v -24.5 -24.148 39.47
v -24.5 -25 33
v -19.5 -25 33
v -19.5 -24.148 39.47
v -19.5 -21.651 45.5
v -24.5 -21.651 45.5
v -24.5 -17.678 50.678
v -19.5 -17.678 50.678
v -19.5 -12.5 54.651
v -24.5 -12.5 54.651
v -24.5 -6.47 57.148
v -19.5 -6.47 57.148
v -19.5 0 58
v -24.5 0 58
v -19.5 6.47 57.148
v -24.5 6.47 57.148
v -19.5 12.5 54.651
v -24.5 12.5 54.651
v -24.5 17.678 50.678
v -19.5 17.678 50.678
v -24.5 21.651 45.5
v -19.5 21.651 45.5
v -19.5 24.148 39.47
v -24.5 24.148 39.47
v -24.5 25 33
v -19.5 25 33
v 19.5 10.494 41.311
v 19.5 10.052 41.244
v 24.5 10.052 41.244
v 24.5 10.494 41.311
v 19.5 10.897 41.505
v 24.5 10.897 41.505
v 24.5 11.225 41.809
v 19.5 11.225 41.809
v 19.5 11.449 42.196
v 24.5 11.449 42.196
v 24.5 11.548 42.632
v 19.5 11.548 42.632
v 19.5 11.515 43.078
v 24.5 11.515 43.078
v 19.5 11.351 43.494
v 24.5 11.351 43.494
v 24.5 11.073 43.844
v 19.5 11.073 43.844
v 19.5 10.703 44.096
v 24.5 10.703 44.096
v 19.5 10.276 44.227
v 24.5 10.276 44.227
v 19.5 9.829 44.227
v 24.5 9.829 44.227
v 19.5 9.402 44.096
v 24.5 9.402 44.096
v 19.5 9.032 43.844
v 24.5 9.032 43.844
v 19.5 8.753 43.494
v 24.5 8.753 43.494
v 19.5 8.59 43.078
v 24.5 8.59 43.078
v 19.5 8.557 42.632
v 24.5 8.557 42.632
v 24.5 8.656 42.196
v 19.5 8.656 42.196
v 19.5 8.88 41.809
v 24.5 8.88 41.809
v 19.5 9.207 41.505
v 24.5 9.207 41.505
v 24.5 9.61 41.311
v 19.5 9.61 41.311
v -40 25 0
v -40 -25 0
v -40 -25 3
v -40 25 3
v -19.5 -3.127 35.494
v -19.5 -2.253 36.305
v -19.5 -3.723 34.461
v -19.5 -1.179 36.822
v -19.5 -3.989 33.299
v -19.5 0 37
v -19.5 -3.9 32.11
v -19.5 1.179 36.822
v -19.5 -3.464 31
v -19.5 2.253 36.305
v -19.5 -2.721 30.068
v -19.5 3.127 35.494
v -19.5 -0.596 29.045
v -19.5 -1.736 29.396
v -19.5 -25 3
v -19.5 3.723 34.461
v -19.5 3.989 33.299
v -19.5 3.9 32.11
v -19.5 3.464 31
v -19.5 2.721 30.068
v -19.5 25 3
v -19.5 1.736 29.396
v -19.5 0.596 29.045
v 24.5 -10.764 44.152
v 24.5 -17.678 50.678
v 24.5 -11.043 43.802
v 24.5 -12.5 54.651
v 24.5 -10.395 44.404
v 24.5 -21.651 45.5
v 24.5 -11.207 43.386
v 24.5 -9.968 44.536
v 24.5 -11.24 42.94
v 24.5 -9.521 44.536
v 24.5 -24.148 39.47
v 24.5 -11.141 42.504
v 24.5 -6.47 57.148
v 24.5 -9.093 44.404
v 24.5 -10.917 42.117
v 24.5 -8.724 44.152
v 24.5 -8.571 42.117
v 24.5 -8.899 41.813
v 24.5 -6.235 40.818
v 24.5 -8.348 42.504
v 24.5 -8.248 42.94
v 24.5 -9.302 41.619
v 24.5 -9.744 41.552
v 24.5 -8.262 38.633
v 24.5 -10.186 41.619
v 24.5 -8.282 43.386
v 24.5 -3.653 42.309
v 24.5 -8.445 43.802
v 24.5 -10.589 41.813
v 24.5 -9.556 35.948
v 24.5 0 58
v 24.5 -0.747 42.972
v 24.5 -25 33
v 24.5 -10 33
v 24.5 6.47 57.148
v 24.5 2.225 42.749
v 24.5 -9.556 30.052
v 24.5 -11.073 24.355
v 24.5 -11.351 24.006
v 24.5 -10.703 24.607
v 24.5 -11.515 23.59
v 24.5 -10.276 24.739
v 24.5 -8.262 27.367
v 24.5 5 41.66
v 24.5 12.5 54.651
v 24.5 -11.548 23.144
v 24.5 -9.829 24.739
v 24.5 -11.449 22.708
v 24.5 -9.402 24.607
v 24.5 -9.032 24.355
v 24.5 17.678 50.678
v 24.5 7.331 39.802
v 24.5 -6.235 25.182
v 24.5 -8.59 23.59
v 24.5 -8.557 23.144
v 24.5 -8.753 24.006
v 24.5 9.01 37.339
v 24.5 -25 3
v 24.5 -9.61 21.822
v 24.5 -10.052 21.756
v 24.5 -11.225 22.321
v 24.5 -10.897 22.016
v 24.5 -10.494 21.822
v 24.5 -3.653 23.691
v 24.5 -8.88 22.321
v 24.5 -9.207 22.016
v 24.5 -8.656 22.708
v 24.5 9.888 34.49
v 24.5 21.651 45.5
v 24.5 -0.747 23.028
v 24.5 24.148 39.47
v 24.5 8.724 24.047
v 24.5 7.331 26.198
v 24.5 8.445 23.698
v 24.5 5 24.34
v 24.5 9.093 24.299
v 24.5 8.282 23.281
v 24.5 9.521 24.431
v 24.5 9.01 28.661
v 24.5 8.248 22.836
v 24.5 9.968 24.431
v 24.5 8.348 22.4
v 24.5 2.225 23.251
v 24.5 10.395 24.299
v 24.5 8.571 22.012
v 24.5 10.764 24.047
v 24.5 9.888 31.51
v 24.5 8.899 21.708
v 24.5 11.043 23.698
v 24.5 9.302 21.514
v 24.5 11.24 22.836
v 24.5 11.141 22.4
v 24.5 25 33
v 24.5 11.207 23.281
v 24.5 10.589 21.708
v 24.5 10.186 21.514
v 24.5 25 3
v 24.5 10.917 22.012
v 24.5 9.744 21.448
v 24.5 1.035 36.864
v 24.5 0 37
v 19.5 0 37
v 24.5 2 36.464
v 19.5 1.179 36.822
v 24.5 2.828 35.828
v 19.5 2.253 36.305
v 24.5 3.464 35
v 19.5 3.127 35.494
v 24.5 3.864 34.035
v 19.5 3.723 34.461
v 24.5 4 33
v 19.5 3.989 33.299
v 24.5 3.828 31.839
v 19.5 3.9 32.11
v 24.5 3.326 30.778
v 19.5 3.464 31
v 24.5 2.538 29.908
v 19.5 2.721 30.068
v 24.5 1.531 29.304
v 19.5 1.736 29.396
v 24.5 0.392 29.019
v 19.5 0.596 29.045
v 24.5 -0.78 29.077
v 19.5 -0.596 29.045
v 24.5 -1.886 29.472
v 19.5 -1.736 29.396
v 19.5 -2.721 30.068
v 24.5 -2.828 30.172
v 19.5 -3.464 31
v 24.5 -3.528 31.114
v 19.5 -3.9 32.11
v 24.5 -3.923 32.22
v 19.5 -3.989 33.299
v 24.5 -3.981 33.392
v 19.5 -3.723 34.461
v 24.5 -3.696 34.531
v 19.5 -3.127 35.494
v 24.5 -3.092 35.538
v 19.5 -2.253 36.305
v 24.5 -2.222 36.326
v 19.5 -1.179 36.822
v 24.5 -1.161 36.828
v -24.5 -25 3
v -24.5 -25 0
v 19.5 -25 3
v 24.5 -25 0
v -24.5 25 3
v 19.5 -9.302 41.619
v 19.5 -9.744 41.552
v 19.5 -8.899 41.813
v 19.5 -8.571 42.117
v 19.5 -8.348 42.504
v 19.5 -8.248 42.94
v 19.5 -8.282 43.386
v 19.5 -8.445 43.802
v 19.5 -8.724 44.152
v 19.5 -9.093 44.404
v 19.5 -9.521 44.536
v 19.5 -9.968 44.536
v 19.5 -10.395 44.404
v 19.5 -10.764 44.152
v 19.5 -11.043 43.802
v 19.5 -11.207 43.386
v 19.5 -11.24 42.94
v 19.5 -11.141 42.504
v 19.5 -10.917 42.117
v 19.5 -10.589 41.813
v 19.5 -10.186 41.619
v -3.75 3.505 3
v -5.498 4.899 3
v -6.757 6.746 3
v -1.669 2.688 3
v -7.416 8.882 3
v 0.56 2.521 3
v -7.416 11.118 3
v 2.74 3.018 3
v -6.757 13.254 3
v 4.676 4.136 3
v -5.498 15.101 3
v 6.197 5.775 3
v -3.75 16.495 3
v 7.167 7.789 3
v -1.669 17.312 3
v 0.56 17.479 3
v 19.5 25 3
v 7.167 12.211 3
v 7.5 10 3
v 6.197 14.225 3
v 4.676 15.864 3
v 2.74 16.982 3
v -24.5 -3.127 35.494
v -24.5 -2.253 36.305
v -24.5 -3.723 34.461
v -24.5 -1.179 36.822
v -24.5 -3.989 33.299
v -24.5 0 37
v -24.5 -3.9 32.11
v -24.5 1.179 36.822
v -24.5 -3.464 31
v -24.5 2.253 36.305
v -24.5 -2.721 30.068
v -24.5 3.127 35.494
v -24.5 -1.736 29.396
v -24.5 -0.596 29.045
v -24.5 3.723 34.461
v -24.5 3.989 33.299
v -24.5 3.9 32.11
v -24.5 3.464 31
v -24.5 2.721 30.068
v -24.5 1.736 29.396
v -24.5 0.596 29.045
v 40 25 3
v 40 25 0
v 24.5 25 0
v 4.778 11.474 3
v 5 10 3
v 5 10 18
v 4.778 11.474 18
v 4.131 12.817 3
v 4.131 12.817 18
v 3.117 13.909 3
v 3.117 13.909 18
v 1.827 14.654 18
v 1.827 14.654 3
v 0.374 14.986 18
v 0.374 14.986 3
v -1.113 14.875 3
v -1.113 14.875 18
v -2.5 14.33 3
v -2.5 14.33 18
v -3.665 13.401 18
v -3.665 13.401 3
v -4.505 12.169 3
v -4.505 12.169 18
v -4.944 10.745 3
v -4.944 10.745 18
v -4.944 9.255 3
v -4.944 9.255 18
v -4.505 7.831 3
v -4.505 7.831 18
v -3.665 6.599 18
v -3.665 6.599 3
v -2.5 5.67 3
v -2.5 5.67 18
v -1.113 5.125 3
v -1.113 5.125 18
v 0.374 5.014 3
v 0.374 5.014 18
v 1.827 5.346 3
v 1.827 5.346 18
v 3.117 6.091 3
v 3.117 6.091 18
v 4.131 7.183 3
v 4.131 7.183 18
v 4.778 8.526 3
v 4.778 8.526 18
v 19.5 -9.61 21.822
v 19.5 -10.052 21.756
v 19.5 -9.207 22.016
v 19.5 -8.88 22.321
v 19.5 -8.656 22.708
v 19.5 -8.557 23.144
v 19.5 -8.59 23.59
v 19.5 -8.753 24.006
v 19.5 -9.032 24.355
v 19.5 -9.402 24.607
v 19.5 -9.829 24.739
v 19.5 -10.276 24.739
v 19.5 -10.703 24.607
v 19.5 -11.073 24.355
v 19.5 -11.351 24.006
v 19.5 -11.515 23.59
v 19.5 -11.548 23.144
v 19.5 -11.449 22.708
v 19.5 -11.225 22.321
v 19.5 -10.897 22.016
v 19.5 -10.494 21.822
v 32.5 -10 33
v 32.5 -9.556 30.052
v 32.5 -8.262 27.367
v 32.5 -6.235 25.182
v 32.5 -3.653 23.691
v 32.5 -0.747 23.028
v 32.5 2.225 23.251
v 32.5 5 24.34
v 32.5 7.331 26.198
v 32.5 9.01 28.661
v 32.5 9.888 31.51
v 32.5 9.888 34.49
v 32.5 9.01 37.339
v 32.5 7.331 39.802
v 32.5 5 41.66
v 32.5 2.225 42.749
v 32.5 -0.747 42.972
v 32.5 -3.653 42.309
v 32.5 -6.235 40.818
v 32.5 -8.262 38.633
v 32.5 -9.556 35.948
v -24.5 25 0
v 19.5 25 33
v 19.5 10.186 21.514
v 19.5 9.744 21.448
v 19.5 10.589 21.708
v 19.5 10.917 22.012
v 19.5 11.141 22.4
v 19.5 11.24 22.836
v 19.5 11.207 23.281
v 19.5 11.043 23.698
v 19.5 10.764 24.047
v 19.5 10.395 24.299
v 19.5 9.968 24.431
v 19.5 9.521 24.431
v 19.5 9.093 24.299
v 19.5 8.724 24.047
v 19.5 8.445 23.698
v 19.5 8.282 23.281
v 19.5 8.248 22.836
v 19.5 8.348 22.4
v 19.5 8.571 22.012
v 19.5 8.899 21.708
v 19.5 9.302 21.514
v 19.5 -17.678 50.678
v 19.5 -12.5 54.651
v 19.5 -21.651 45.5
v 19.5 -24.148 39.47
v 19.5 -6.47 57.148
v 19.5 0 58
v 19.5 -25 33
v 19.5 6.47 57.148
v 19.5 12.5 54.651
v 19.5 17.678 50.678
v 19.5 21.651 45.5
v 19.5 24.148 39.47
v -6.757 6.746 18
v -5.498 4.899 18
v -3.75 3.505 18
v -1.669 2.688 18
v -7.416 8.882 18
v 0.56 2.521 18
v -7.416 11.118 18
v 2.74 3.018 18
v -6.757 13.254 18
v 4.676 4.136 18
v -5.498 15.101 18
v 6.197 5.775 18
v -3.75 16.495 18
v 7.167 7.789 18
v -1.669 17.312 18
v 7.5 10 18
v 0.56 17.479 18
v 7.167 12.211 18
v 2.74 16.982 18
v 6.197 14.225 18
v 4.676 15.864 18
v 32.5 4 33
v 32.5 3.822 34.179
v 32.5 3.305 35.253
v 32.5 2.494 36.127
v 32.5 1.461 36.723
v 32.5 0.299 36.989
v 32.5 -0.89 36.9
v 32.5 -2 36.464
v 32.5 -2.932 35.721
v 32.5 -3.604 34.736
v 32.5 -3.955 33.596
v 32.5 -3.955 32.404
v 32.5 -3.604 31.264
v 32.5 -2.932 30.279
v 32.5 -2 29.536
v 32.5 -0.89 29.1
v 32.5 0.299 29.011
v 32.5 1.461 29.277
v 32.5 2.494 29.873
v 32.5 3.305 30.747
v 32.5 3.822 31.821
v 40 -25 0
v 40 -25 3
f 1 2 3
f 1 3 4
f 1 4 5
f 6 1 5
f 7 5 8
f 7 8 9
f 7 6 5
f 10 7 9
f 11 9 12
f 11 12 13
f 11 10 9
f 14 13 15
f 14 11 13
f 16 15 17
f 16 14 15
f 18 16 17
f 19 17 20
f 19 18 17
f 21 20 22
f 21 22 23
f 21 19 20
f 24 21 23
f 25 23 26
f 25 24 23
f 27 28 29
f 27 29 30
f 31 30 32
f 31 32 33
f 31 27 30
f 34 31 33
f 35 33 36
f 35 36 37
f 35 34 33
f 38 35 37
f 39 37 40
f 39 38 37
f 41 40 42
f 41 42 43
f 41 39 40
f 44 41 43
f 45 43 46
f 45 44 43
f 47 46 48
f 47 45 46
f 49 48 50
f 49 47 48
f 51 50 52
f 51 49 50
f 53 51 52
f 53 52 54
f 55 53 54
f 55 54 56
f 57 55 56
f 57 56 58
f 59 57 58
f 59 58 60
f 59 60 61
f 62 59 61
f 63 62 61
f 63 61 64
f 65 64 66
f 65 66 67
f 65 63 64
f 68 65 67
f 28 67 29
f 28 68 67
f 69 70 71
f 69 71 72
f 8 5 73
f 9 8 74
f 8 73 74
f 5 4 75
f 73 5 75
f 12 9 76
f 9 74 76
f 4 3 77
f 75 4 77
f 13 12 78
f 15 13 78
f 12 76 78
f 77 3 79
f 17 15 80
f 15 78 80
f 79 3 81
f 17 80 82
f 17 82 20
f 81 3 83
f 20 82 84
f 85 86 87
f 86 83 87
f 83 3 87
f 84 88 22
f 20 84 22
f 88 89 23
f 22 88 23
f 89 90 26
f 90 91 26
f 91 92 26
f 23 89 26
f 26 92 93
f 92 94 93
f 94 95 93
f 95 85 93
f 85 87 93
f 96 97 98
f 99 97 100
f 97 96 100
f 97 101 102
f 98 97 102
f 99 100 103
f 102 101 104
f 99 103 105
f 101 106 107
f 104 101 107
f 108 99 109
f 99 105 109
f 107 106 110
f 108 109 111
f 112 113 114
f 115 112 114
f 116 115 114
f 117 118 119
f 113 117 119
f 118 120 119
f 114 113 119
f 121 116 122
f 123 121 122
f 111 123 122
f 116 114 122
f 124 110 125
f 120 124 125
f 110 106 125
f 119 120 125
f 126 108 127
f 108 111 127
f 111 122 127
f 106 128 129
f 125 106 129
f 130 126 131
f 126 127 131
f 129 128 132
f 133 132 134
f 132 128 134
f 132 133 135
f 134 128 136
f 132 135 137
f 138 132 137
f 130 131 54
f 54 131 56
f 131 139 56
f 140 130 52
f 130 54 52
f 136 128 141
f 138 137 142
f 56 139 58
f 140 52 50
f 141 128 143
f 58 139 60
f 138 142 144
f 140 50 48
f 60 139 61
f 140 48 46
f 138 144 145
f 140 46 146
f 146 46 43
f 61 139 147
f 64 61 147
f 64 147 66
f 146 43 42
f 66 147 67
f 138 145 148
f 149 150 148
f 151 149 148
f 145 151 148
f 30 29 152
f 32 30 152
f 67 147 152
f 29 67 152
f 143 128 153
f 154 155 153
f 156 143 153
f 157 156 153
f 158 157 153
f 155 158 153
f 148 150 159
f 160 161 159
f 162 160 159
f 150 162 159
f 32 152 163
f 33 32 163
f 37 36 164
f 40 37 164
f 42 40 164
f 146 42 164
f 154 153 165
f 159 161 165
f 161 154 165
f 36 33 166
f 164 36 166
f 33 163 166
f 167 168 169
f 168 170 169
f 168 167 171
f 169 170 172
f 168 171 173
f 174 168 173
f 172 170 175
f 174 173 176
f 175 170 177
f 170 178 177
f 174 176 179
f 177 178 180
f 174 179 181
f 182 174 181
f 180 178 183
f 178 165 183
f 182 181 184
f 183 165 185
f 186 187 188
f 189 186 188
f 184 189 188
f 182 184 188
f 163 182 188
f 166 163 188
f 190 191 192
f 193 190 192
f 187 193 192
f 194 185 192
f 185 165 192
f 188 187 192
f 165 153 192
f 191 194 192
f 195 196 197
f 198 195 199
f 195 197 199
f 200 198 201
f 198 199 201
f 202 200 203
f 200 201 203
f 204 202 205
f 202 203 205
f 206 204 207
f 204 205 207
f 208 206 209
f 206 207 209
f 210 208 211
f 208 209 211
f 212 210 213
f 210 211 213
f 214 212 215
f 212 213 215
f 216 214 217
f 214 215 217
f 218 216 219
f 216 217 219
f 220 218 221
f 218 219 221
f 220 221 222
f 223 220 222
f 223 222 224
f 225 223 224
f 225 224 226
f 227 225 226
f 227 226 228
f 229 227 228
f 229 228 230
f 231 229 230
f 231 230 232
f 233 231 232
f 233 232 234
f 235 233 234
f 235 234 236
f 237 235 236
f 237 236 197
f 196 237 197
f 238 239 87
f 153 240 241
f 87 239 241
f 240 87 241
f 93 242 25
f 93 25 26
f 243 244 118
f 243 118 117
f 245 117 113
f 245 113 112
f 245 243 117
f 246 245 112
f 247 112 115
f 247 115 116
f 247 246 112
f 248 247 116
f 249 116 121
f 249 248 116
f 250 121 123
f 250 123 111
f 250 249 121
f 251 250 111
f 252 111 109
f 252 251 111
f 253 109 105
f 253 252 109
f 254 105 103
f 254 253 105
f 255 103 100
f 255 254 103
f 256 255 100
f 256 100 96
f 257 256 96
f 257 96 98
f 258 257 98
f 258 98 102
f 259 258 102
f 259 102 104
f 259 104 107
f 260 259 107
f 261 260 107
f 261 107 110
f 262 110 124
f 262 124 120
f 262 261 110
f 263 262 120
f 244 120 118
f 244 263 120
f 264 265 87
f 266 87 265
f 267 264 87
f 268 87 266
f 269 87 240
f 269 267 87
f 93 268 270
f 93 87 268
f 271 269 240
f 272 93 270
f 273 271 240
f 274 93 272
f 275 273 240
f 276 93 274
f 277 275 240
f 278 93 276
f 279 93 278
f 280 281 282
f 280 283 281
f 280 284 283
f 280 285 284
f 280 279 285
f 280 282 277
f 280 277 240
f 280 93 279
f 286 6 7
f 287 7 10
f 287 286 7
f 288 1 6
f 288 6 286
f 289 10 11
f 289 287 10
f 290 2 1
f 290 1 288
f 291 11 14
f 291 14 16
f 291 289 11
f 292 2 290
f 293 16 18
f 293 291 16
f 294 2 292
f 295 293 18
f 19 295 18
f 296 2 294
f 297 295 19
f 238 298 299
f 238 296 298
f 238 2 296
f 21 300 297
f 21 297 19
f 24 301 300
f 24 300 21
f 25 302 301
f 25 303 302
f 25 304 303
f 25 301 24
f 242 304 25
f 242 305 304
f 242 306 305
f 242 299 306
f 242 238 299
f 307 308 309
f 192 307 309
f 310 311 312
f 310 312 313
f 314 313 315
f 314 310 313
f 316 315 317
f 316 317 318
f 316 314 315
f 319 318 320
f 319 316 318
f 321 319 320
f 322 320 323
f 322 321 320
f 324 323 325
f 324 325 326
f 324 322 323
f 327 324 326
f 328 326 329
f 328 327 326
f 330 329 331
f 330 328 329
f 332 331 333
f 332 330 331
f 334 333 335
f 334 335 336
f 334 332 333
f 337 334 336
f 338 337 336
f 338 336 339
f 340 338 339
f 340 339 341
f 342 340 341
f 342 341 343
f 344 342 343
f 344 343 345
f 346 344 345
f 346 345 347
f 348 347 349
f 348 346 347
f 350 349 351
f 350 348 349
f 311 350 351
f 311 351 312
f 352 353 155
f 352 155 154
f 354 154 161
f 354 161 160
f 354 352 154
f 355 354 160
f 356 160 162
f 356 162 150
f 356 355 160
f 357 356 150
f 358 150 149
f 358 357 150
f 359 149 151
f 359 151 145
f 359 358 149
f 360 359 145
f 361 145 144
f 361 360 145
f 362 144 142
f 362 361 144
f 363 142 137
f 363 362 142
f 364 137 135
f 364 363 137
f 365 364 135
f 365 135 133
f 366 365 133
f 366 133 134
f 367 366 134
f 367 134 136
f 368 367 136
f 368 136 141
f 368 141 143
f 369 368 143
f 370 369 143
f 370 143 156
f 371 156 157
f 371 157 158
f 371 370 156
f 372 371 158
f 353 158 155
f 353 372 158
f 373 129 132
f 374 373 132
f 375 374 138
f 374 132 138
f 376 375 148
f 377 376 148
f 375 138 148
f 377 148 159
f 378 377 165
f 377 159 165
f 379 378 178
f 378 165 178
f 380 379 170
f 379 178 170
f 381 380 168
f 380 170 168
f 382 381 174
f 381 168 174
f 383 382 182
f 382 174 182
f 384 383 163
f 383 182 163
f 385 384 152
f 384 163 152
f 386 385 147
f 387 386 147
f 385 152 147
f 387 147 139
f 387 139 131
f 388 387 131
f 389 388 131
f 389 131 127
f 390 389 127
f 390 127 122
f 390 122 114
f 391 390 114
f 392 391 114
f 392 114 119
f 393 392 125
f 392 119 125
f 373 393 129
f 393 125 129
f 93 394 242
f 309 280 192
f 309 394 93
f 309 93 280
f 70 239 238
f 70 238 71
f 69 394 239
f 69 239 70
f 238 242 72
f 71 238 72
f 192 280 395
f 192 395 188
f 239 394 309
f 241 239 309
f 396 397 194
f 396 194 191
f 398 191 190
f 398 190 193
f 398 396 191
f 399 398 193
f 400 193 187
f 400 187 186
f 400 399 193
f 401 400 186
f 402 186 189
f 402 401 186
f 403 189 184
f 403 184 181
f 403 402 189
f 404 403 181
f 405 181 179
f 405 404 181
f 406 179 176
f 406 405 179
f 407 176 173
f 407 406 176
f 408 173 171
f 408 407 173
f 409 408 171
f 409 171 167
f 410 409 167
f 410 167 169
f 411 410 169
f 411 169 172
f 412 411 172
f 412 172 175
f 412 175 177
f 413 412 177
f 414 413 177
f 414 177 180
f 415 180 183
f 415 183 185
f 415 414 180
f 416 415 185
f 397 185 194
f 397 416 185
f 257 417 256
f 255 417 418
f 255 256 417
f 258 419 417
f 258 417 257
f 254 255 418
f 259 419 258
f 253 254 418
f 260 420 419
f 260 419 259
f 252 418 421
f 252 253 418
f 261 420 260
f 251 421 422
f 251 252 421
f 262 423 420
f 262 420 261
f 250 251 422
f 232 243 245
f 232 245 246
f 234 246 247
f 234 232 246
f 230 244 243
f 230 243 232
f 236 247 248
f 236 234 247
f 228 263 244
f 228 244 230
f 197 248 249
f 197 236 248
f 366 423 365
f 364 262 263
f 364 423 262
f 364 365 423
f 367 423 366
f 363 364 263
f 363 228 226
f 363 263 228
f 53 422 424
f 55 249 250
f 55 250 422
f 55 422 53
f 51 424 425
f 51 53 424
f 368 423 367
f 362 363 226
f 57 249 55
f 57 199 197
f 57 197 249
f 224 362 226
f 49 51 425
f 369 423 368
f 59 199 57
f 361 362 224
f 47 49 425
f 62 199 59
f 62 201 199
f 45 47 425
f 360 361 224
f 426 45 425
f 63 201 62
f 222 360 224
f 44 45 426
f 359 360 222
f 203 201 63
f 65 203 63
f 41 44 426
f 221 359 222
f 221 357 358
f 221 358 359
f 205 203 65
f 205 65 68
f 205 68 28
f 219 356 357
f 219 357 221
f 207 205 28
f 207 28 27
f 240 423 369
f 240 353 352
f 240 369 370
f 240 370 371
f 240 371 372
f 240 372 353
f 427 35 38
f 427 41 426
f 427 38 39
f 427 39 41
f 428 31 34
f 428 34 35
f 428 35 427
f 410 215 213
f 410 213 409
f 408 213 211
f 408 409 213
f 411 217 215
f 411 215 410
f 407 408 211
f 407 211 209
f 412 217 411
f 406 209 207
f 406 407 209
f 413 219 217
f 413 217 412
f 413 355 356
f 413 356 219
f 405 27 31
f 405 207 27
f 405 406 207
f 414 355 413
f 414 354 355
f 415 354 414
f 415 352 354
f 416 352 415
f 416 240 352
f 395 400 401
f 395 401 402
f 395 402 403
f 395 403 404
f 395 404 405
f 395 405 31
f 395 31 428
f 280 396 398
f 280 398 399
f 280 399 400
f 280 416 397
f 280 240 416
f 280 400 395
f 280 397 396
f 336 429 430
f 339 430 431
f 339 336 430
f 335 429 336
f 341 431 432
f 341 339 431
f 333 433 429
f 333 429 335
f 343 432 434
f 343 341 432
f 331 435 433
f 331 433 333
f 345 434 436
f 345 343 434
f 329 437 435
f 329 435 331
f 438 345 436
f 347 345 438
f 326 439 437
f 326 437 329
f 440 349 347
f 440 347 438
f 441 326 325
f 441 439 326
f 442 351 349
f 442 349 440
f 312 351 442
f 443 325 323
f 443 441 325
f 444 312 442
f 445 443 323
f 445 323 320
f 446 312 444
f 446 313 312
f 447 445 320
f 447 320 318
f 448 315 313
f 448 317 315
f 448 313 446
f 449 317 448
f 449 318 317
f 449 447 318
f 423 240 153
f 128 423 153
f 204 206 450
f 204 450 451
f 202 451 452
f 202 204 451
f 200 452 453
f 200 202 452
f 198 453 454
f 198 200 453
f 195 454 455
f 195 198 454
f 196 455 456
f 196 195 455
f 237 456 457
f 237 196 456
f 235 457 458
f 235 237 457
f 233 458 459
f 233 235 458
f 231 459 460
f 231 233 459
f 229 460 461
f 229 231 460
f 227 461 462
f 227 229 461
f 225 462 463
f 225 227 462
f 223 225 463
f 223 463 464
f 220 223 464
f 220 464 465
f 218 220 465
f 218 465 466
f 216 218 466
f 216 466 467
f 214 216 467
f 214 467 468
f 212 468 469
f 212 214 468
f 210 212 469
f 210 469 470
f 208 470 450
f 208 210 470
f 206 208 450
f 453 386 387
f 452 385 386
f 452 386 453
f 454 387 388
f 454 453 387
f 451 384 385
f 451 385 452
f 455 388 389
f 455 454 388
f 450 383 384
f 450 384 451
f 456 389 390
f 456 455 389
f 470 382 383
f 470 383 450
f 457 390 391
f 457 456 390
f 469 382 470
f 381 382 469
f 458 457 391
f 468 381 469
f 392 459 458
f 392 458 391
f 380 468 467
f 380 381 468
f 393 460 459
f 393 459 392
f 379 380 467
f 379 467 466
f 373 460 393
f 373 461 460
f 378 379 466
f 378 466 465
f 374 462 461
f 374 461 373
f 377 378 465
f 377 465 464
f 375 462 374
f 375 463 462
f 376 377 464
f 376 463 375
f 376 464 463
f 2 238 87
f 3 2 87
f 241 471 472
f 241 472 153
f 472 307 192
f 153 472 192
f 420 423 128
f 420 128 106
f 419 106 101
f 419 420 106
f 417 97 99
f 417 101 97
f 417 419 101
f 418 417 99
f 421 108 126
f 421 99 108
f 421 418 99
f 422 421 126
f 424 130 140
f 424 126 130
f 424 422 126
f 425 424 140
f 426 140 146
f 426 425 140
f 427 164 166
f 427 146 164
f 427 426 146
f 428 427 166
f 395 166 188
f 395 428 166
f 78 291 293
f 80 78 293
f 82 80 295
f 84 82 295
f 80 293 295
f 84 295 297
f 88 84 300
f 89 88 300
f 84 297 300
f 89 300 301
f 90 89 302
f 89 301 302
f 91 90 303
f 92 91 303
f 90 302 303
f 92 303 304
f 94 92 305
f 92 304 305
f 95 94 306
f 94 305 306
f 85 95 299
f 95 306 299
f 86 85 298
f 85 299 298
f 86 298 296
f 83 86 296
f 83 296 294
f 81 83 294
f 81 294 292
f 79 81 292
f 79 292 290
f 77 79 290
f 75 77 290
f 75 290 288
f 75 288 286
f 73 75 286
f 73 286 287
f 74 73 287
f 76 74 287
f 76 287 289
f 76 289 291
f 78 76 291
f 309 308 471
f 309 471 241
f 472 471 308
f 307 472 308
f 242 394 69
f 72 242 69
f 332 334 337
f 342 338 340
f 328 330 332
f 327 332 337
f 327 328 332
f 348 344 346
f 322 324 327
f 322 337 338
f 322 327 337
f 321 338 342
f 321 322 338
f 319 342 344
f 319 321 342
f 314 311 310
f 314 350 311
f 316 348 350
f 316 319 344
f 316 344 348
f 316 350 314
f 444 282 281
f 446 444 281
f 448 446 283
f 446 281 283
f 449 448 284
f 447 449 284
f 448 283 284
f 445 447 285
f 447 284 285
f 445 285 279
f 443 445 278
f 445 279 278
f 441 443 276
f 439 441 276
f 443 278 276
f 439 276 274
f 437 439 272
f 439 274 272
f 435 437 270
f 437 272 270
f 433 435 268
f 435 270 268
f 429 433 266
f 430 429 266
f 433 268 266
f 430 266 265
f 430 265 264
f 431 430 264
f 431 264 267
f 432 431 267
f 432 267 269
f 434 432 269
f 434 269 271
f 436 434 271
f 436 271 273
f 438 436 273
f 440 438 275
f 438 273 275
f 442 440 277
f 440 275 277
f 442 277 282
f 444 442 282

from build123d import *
from build123d.topology import SkipClean

# Parameters (mm, degrees)
SKETCH1_W              = 49
SKETCH1_H              = 50
BOSS_EXTRUDE1_DEPTH    = 3
SKETCH2_W              = 5
SKETCH2_H              = 50
BOSS_EXTRUDE2_DEPTH    = 55
SKETCH3_OUTSIDE_W      = 78.182
SKETCH3_OUTSIDE_H      = 70.182
SKETCH3_OUTSIDE_R      = 4
CUT_EXTRUDE1_DEPTH     = 80.937475567
SKETCH4_R              = 7.5
SKETCH4_R_2            = 5
BOSS_EXTRUDE3_DEPTH    = 15
SKETCH5_R              = 10
SKETCH5_R_2            = 4
BOSS_EXTRUDE4_DEPTH    = 8
CUT_EXTRUDE2_START     = -5
CUT_EXTRUDE2_OUTLINE_R = 1.5
CUT_EXTRUDE2_DEPTH     = 5
SKETCH7_W              = 80
SKETCH7_H              = 50
BOSS_EXTRUDE5_DEPTH    = 3


# Read off the part's stored shape, not the designer's step: Cut-Extrude2
with BuildPart() as part:
    # Sketch1 → Boss-Extrude1 (new body)
    with BuildSketch(Plane.XY):
        Rectangle(SKETCH1_W, SKETCH1_H)
    extrude(amount=BOSS_EXTRUDE1_DEPTH)

    # Sketch2 → Boss-Extrude2 (add)
    with BuildSketch(Plane.XY.offset(3)):
        with Locations((-22, 0)):
            Rectangle(SKETCH2_W, SKETCH2_H)
        with Locations((22, 0)):
            Rectangle(SKETCH2_W, SKETCH2_H)
    extrude(amount=BOSS_EXTRUDE2_DEPTH)

    # Sketch3 outside → Cut-Extrude1 (cut, through all)
    # profile 1 of 2: a face of its own
    with BuildSketch(Plane.ZY.offset(24.5)):
        with Locations((29, 0)):
            Rectangle(SKETCH3_OUTSIDE_W, SKETCH3_OUTSIDE_H)
        with BuildLine():
            Line((0, 25), (0, -25))
            Line((0, -25), (33, -25))
            ThreePointArc((33, -25), (58, 0), (33, 25))
            Line((33, 25), (0, 25))
        make_face(mode=Mode.SUBTRACT)
    # profile 2 of 2: a face of its own
    with BuildSketch(Plane.ZY.offset(24.5)):
        with Locations((33, 0)):
            Circle(SKETCH3_OUTSIDE_R)
    extrude(amount=-CUT_EXTRUDE1_DEPTH, mode=Mode.SUBTRACT)

    # Sketch4 → Boss-Extrude3 (add)
    with BuildSketch(Plane.XY.offset(3)):
        with Locations((0, 10)):
            Circle(SKETCH4_R)
        with Locations((0, 10)):
            Circle(SKETCH4_R_2, mode=Mode.SUBTRACT)
    extrude(amount=BOSS_EXTRUDE3_DEPTH)

    # Sketch5 → Boss-Extrude4 (add)
    with SkipClean():  # the faces are left unmerged after this step: merging them gives an invalid solid
        with BuildSketch(Plane(origin=(24.5, 0, 0), x_dir=(0, 0, -1), z_dir=(1, 0, 0))):
            with Locations(Location((-33, 0, 0), (0, 0, 270))):
                Circle(SKETCH5_R)
            with Locations(Location((-33, 0, 0), (0, 0, 90))):
                Circle(SKETCH5_R_2, mode=Mode.SUBTRACT)
        extrude(amount=BOSS_EXTRUDE4_DEPTH)

    # Cut-Extrude2 outline → Cut-Extrude2 (cut)
    with SkipClean():  # the faces are left unmerged after this step: merging them gives an invalid solid
        with BuildSketch(Plane(origin=(24.5, 0, 0), x_dir=(0, 0, -1), z_dir=(1, 0, 0)).offset(CUT_EXTRUDE2_START)):
            with Locations((-42.744235689, 10.052356482)):
                Circle(CUT_EXTRUDE2_OUTLINE_R)
            with Locations((-22.947643518, 9.744235689)):
                Circle(CUT_EXTRUDE2_OUTLINE_R)
            with Locations((-23.255764311, -10.052356482)):
                Circle(CUT_EXTRUDE2_OUTLINE_R)
            with Locations((-43.052356482, -9.744235689)):
                Circle(CUT_EXTRUDE2_OUTLINE_R)
        extrude(amount=CUT_EXTRUDE2_DEPTH, mode=Mode.SUBTRACT)

    # Sketch7 → Boss-Extrude5 (add)
    with SkipClean():  # the faces are left unmerged after this step: merging them gives an invalid solid
        with BuildSketch(Plane(origin=(0, 0, 0), x_dir=(-1, 0, 0), z_dir=(0, 0, -1))):
            Rectangle(SKETCH7_W, SKETCH7_H)
        extrude(amount=-BOSS_EXTRUDE5_DEPTH)


solid = part.part
